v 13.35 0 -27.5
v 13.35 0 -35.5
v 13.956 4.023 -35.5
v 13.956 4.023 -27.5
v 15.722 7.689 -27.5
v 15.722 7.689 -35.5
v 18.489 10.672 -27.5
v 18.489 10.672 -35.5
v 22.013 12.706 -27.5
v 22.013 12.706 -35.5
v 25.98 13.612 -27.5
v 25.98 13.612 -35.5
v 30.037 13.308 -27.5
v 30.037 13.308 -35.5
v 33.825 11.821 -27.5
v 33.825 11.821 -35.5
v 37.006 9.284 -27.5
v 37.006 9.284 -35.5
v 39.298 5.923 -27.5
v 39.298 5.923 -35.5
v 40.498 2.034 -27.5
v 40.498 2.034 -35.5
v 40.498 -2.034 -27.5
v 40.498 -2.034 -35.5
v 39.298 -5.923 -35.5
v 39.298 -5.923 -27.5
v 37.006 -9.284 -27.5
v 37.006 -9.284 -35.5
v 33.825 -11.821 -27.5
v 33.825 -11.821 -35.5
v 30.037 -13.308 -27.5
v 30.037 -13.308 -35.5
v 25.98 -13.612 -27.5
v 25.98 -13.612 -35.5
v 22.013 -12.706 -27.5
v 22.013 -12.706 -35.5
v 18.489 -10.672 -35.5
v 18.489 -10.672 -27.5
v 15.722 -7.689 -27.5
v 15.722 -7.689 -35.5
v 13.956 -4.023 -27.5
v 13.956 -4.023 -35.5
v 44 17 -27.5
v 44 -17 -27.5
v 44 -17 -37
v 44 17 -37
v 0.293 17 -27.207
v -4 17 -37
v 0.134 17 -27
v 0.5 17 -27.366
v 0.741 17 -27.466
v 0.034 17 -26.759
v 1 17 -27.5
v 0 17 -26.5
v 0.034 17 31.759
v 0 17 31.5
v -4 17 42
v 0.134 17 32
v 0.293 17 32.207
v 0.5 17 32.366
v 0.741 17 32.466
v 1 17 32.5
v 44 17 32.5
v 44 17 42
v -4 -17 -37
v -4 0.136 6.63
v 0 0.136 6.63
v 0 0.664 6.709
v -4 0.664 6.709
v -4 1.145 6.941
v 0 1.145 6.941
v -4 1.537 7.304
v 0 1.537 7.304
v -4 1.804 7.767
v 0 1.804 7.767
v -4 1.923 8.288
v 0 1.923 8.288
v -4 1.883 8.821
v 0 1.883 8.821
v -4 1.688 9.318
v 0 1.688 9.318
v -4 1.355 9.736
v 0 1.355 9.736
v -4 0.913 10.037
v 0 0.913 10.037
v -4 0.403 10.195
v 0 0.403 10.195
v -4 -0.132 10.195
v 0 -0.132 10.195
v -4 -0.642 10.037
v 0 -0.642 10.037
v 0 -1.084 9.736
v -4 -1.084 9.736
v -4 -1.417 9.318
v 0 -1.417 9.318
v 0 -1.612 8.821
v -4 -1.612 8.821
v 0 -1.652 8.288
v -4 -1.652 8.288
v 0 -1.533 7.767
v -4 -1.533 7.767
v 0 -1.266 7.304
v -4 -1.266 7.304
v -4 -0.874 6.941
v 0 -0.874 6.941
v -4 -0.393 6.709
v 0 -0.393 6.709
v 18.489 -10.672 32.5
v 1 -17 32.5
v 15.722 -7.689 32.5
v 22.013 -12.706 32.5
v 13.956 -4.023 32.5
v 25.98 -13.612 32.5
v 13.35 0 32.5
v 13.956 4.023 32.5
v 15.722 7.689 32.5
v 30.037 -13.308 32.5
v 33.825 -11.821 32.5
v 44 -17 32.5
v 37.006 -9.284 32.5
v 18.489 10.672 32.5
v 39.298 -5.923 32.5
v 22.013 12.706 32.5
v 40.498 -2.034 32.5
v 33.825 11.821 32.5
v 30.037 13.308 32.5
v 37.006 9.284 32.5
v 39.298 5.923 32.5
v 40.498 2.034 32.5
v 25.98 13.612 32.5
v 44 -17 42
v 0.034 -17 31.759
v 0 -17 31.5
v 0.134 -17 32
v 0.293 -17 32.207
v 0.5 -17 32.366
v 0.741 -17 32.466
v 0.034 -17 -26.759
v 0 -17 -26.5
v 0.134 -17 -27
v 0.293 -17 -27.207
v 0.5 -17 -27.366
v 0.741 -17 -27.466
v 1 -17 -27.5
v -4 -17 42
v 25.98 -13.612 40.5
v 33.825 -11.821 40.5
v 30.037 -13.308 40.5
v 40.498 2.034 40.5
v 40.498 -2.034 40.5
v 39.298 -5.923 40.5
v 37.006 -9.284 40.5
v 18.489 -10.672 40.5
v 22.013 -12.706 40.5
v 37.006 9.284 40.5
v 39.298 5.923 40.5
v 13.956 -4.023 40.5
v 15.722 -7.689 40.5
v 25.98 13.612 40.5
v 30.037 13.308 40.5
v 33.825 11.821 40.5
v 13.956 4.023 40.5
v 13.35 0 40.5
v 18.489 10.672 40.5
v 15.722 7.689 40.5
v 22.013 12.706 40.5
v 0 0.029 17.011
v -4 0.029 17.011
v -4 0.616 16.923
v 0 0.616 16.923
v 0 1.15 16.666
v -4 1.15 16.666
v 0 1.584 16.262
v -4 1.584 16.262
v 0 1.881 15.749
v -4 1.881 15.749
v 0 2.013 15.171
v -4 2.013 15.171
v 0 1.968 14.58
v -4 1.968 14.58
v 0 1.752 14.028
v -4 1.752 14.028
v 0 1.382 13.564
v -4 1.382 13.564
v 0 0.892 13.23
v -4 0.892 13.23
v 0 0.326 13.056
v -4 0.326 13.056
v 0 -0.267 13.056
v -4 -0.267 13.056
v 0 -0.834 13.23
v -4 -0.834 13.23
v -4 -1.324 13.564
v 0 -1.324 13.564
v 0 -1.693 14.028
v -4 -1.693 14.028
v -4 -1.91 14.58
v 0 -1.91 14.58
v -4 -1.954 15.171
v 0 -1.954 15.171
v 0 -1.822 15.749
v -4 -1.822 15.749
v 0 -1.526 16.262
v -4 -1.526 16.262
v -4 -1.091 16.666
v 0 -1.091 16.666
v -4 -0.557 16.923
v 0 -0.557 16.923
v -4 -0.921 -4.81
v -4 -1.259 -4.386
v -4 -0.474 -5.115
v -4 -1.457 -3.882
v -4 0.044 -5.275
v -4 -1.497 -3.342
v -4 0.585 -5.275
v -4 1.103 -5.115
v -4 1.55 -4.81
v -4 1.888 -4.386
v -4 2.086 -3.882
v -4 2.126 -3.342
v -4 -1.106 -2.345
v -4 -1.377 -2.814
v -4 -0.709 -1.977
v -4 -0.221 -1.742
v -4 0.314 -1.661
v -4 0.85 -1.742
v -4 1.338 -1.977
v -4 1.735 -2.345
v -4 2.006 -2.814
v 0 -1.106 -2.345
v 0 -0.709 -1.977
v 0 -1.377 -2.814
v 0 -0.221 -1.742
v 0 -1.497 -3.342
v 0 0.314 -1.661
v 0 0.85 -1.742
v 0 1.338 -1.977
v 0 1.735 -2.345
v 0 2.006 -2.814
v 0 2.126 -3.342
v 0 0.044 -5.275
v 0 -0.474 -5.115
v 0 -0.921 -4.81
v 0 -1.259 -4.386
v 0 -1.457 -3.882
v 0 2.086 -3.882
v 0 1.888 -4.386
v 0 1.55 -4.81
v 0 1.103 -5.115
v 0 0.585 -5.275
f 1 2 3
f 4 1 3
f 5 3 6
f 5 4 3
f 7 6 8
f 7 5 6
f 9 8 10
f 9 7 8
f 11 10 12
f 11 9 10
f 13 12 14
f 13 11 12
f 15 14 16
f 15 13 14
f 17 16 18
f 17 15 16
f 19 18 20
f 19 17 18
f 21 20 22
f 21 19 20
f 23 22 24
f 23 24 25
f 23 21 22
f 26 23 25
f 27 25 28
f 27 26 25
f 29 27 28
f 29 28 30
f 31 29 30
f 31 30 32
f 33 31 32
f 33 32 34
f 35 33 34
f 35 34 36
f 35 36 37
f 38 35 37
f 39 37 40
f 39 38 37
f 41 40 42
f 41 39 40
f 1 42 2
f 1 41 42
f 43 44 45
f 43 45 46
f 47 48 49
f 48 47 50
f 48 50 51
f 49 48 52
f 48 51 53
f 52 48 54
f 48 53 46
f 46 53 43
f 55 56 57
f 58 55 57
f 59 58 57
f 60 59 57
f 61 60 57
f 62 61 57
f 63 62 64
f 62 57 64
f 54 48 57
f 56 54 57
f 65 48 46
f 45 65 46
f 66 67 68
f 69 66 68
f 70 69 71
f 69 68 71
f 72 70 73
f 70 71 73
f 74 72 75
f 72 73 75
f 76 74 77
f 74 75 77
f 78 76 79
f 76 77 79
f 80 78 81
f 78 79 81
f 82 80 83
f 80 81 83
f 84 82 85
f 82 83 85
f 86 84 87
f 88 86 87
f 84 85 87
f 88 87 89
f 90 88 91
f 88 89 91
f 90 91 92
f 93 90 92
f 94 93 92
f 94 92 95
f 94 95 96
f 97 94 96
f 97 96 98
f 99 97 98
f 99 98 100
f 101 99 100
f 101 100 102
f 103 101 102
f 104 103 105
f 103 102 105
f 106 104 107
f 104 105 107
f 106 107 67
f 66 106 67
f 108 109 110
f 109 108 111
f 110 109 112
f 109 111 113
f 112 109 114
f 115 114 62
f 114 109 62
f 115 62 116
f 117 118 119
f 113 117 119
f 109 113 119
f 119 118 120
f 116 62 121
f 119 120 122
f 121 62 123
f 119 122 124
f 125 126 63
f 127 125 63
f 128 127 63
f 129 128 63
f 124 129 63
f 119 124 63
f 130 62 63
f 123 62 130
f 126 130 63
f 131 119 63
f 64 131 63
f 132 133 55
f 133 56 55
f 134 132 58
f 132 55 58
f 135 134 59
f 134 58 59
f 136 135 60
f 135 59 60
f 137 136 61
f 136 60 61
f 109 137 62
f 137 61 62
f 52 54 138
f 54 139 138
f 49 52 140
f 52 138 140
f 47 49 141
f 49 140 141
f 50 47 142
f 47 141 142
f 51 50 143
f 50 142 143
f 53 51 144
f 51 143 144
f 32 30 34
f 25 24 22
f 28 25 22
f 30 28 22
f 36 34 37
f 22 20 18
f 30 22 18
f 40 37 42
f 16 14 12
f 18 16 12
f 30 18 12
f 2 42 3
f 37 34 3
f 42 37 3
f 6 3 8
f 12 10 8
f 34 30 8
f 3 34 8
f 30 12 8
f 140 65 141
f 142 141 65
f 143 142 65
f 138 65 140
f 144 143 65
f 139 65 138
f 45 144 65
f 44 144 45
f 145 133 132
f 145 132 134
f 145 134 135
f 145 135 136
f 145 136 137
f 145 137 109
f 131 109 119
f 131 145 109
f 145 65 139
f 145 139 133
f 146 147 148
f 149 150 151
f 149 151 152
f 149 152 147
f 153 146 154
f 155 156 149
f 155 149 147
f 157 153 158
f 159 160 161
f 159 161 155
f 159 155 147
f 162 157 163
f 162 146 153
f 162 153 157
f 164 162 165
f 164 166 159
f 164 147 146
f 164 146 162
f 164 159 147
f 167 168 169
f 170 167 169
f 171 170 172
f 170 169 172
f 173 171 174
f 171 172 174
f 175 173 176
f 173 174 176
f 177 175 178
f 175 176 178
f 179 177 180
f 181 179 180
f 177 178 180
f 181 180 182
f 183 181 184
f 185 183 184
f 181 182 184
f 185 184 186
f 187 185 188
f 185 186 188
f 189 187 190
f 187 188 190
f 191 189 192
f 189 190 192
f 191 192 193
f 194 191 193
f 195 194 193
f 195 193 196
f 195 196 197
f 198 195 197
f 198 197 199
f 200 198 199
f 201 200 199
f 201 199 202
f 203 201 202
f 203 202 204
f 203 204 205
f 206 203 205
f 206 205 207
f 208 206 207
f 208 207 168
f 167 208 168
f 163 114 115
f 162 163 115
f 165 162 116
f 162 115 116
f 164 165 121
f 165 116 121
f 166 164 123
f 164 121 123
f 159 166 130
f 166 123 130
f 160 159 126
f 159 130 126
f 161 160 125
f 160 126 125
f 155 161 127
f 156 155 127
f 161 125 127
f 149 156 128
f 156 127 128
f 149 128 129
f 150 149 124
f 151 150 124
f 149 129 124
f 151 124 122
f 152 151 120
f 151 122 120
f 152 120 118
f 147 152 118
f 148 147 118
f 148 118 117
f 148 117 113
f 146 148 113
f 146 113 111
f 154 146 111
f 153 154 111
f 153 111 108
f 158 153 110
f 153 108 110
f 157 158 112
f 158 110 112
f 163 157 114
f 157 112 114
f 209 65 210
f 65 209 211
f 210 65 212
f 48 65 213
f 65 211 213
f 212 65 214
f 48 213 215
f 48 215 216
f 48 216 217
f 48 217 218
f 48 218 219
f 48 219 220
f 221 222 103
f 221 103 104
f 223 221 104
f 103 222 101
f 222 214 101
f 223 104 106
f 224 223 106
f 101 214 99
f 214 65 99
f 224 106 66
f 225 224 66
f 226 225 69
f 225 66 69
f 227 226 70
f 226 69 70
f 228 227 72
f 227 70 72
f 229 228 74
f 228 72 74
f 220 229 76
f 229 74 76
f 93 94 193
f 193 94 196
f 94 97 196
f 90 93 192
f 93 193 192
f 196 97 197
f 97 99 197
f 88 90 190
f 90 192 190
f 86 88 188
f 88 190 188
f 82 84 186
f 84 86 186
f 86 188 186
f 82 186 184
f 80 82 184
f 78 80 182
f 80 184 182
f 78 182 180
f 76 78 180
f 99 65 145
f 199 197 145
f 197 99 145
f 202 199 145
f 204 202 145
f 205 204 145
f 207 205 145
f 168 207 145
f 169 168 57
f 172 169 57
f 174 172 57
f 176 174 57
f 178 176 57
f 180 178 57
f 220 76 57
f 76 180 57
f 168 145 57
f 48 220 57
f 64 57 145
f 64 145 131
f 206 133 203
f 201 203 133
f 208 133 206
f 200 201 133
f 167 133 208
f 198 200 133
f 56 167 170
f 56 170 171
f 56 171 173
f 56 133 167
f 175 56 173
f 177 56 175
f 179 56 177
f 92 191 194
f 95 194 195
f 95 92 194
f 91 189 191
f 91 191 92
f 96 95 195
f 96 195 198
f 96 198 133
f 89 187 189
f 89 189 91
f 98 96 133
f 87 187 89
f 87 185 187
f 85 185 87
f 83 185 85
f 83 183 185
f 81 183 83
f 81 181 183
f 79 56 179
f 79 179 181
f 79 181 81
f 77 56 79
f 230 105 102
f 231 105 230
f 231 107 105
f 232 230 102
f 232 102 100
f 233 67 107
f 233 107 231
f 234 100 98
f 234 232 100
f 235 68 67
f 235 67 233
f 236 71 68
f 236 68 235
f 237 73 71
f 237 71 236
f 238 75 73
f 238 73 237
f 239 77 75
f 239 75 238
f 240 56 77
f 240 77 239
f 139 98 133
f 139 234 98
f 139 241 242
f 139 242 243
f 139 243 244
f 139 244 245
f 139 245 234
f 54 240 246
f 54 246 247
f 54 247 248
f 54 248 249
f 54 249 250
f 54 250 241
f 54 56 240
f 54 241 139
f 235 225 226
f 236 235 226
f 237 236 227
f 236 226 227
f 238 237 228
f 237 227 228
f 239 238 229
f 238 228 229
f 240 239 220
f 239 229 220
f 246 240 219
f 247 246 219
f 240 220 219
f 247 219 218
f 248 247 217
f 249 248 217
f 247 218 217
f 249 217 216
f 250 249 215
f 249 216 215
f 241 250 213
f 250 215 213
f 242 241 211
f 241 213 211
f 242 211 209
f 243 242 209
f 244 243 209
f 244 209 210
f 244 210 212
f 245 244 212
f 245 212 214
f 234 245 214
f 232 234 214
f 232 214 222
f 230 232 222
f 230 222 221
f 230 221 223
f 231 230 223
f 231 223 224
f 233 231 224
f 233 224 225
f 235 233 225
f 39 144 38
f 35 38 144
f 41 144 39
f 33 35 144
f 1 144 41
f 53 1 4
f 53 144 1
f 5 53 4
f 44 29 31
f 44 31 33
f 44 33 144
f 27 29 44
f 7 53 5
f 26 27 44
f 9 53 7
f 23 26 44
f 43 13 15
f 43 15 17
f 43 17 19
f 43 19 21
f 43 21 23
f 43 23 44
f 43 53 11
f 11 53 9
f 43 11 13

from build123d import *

# Parameters (mm, degrees)
SKETCH1_W           = 65
SKETCH1_H           = 34
SKETCH1_R           = 1.792638337
BOSS_EXTRUDE1_DEPTH = 4
SKETCH3_W           = 48
SKETCH3_H           = 34
BOSS_EXTRUDE2_DEPTH = 9.5
FILLET4_R           = 1
FILLET5_R           = 1
SKETCH5_R           = 13.65
CUT_EXTRUDE1_DEPTH  = 8
SKETCH6_R           = 1.817001486
SKETCH6_R_2         = 1.988961177
CUT_EXTRUDE2_DEPTH  = 10


with BuildPart() as part:
    # Sketch1 → Boss-Extrude1 (new body)
    with BuildSketch(Plane(origin=(0, 0, 0), x_dir=(0, 0, -1), z_dir=(1, 0, 0))):
        Rectangle(SKETCH1_W, SKETCH1_H)
        with Locations((-8.422145585, 0.13559033)):
            Circle(SKETCH1_R, mode=Mode.SUBTRACT)
    extrude(amount=-BOSS_EXTRUDE1_DEPTH)

    # Sketch3 → Boss-Extrude2 (add)
    with BuildSketch(Plane.XY.offset(32.5)):
        with Locations((20, 0)):
            Rectangle(SKETCH3_W, SKETCH3_H)
    boss_extrude2 = extrude(amount=BOSS_EXTRUDE2_DEPTH)

    # Mirror1: Boss-Extrude2 across plane
    add(boss_extrude2.mirror(Plane(origin=(0, 0, 2.5), x_dir=(1, 0, 0), z_dir=(0, 0, -1))))

    # Fillet4
    fillet4_edges = [part.edges().sort_by_distance(p)[0] for p in [
        (0, 0, 32.5),
    ]]
    fillet(fillet4_edges, radius=FILLET4_R)

    # Fillet5
    fillet5_edges = [part.edges().sort_by_distance(p)[0] for p in [
        (0, 0, -27.5),
    ]]
    fillet(fillet5_edges, radius=FILLET5_R)

    # Sketch5 → Cut-Extrude1 (cut)
    with BuildSketch(Plane(origin=(0, 0, 32.5), x_dir=(-1, 0, 0), z_dir=(0, 0, -1))):
        with Locations((-27, 0)):
            Circle(SKETCH5_R)
    cut_extrude1 = extrude(amount=-CUT_EXTRUDE1_DEPTH, mode=Mode.SUBTRACT)

    # Mirror2: Cut-Extrude1 across plane
    add(cut_extrude1.mirror(Plane(origin=(0, 0, 2.5), x_dir=(1, 0, 0), z_dir=(0, 0, -1))), mode=Mode.SUBTRACT)

    # Sketch6 → Cut-Extrude2 (cut)
    with BuildSketch(Plane.ZY.offset(4)):
        with Locations((-3.477810301, 0.314468999)):
            Circle(SKETCH6_R)
        with Locations((15.022387571, 0.02925164)):
            Circle(SKETCH6_R_2)
    extrude(amount=-CUT_EXTRUDE2_DEPTH, mode=Mode.SUBTRACT)


solid = part.part
